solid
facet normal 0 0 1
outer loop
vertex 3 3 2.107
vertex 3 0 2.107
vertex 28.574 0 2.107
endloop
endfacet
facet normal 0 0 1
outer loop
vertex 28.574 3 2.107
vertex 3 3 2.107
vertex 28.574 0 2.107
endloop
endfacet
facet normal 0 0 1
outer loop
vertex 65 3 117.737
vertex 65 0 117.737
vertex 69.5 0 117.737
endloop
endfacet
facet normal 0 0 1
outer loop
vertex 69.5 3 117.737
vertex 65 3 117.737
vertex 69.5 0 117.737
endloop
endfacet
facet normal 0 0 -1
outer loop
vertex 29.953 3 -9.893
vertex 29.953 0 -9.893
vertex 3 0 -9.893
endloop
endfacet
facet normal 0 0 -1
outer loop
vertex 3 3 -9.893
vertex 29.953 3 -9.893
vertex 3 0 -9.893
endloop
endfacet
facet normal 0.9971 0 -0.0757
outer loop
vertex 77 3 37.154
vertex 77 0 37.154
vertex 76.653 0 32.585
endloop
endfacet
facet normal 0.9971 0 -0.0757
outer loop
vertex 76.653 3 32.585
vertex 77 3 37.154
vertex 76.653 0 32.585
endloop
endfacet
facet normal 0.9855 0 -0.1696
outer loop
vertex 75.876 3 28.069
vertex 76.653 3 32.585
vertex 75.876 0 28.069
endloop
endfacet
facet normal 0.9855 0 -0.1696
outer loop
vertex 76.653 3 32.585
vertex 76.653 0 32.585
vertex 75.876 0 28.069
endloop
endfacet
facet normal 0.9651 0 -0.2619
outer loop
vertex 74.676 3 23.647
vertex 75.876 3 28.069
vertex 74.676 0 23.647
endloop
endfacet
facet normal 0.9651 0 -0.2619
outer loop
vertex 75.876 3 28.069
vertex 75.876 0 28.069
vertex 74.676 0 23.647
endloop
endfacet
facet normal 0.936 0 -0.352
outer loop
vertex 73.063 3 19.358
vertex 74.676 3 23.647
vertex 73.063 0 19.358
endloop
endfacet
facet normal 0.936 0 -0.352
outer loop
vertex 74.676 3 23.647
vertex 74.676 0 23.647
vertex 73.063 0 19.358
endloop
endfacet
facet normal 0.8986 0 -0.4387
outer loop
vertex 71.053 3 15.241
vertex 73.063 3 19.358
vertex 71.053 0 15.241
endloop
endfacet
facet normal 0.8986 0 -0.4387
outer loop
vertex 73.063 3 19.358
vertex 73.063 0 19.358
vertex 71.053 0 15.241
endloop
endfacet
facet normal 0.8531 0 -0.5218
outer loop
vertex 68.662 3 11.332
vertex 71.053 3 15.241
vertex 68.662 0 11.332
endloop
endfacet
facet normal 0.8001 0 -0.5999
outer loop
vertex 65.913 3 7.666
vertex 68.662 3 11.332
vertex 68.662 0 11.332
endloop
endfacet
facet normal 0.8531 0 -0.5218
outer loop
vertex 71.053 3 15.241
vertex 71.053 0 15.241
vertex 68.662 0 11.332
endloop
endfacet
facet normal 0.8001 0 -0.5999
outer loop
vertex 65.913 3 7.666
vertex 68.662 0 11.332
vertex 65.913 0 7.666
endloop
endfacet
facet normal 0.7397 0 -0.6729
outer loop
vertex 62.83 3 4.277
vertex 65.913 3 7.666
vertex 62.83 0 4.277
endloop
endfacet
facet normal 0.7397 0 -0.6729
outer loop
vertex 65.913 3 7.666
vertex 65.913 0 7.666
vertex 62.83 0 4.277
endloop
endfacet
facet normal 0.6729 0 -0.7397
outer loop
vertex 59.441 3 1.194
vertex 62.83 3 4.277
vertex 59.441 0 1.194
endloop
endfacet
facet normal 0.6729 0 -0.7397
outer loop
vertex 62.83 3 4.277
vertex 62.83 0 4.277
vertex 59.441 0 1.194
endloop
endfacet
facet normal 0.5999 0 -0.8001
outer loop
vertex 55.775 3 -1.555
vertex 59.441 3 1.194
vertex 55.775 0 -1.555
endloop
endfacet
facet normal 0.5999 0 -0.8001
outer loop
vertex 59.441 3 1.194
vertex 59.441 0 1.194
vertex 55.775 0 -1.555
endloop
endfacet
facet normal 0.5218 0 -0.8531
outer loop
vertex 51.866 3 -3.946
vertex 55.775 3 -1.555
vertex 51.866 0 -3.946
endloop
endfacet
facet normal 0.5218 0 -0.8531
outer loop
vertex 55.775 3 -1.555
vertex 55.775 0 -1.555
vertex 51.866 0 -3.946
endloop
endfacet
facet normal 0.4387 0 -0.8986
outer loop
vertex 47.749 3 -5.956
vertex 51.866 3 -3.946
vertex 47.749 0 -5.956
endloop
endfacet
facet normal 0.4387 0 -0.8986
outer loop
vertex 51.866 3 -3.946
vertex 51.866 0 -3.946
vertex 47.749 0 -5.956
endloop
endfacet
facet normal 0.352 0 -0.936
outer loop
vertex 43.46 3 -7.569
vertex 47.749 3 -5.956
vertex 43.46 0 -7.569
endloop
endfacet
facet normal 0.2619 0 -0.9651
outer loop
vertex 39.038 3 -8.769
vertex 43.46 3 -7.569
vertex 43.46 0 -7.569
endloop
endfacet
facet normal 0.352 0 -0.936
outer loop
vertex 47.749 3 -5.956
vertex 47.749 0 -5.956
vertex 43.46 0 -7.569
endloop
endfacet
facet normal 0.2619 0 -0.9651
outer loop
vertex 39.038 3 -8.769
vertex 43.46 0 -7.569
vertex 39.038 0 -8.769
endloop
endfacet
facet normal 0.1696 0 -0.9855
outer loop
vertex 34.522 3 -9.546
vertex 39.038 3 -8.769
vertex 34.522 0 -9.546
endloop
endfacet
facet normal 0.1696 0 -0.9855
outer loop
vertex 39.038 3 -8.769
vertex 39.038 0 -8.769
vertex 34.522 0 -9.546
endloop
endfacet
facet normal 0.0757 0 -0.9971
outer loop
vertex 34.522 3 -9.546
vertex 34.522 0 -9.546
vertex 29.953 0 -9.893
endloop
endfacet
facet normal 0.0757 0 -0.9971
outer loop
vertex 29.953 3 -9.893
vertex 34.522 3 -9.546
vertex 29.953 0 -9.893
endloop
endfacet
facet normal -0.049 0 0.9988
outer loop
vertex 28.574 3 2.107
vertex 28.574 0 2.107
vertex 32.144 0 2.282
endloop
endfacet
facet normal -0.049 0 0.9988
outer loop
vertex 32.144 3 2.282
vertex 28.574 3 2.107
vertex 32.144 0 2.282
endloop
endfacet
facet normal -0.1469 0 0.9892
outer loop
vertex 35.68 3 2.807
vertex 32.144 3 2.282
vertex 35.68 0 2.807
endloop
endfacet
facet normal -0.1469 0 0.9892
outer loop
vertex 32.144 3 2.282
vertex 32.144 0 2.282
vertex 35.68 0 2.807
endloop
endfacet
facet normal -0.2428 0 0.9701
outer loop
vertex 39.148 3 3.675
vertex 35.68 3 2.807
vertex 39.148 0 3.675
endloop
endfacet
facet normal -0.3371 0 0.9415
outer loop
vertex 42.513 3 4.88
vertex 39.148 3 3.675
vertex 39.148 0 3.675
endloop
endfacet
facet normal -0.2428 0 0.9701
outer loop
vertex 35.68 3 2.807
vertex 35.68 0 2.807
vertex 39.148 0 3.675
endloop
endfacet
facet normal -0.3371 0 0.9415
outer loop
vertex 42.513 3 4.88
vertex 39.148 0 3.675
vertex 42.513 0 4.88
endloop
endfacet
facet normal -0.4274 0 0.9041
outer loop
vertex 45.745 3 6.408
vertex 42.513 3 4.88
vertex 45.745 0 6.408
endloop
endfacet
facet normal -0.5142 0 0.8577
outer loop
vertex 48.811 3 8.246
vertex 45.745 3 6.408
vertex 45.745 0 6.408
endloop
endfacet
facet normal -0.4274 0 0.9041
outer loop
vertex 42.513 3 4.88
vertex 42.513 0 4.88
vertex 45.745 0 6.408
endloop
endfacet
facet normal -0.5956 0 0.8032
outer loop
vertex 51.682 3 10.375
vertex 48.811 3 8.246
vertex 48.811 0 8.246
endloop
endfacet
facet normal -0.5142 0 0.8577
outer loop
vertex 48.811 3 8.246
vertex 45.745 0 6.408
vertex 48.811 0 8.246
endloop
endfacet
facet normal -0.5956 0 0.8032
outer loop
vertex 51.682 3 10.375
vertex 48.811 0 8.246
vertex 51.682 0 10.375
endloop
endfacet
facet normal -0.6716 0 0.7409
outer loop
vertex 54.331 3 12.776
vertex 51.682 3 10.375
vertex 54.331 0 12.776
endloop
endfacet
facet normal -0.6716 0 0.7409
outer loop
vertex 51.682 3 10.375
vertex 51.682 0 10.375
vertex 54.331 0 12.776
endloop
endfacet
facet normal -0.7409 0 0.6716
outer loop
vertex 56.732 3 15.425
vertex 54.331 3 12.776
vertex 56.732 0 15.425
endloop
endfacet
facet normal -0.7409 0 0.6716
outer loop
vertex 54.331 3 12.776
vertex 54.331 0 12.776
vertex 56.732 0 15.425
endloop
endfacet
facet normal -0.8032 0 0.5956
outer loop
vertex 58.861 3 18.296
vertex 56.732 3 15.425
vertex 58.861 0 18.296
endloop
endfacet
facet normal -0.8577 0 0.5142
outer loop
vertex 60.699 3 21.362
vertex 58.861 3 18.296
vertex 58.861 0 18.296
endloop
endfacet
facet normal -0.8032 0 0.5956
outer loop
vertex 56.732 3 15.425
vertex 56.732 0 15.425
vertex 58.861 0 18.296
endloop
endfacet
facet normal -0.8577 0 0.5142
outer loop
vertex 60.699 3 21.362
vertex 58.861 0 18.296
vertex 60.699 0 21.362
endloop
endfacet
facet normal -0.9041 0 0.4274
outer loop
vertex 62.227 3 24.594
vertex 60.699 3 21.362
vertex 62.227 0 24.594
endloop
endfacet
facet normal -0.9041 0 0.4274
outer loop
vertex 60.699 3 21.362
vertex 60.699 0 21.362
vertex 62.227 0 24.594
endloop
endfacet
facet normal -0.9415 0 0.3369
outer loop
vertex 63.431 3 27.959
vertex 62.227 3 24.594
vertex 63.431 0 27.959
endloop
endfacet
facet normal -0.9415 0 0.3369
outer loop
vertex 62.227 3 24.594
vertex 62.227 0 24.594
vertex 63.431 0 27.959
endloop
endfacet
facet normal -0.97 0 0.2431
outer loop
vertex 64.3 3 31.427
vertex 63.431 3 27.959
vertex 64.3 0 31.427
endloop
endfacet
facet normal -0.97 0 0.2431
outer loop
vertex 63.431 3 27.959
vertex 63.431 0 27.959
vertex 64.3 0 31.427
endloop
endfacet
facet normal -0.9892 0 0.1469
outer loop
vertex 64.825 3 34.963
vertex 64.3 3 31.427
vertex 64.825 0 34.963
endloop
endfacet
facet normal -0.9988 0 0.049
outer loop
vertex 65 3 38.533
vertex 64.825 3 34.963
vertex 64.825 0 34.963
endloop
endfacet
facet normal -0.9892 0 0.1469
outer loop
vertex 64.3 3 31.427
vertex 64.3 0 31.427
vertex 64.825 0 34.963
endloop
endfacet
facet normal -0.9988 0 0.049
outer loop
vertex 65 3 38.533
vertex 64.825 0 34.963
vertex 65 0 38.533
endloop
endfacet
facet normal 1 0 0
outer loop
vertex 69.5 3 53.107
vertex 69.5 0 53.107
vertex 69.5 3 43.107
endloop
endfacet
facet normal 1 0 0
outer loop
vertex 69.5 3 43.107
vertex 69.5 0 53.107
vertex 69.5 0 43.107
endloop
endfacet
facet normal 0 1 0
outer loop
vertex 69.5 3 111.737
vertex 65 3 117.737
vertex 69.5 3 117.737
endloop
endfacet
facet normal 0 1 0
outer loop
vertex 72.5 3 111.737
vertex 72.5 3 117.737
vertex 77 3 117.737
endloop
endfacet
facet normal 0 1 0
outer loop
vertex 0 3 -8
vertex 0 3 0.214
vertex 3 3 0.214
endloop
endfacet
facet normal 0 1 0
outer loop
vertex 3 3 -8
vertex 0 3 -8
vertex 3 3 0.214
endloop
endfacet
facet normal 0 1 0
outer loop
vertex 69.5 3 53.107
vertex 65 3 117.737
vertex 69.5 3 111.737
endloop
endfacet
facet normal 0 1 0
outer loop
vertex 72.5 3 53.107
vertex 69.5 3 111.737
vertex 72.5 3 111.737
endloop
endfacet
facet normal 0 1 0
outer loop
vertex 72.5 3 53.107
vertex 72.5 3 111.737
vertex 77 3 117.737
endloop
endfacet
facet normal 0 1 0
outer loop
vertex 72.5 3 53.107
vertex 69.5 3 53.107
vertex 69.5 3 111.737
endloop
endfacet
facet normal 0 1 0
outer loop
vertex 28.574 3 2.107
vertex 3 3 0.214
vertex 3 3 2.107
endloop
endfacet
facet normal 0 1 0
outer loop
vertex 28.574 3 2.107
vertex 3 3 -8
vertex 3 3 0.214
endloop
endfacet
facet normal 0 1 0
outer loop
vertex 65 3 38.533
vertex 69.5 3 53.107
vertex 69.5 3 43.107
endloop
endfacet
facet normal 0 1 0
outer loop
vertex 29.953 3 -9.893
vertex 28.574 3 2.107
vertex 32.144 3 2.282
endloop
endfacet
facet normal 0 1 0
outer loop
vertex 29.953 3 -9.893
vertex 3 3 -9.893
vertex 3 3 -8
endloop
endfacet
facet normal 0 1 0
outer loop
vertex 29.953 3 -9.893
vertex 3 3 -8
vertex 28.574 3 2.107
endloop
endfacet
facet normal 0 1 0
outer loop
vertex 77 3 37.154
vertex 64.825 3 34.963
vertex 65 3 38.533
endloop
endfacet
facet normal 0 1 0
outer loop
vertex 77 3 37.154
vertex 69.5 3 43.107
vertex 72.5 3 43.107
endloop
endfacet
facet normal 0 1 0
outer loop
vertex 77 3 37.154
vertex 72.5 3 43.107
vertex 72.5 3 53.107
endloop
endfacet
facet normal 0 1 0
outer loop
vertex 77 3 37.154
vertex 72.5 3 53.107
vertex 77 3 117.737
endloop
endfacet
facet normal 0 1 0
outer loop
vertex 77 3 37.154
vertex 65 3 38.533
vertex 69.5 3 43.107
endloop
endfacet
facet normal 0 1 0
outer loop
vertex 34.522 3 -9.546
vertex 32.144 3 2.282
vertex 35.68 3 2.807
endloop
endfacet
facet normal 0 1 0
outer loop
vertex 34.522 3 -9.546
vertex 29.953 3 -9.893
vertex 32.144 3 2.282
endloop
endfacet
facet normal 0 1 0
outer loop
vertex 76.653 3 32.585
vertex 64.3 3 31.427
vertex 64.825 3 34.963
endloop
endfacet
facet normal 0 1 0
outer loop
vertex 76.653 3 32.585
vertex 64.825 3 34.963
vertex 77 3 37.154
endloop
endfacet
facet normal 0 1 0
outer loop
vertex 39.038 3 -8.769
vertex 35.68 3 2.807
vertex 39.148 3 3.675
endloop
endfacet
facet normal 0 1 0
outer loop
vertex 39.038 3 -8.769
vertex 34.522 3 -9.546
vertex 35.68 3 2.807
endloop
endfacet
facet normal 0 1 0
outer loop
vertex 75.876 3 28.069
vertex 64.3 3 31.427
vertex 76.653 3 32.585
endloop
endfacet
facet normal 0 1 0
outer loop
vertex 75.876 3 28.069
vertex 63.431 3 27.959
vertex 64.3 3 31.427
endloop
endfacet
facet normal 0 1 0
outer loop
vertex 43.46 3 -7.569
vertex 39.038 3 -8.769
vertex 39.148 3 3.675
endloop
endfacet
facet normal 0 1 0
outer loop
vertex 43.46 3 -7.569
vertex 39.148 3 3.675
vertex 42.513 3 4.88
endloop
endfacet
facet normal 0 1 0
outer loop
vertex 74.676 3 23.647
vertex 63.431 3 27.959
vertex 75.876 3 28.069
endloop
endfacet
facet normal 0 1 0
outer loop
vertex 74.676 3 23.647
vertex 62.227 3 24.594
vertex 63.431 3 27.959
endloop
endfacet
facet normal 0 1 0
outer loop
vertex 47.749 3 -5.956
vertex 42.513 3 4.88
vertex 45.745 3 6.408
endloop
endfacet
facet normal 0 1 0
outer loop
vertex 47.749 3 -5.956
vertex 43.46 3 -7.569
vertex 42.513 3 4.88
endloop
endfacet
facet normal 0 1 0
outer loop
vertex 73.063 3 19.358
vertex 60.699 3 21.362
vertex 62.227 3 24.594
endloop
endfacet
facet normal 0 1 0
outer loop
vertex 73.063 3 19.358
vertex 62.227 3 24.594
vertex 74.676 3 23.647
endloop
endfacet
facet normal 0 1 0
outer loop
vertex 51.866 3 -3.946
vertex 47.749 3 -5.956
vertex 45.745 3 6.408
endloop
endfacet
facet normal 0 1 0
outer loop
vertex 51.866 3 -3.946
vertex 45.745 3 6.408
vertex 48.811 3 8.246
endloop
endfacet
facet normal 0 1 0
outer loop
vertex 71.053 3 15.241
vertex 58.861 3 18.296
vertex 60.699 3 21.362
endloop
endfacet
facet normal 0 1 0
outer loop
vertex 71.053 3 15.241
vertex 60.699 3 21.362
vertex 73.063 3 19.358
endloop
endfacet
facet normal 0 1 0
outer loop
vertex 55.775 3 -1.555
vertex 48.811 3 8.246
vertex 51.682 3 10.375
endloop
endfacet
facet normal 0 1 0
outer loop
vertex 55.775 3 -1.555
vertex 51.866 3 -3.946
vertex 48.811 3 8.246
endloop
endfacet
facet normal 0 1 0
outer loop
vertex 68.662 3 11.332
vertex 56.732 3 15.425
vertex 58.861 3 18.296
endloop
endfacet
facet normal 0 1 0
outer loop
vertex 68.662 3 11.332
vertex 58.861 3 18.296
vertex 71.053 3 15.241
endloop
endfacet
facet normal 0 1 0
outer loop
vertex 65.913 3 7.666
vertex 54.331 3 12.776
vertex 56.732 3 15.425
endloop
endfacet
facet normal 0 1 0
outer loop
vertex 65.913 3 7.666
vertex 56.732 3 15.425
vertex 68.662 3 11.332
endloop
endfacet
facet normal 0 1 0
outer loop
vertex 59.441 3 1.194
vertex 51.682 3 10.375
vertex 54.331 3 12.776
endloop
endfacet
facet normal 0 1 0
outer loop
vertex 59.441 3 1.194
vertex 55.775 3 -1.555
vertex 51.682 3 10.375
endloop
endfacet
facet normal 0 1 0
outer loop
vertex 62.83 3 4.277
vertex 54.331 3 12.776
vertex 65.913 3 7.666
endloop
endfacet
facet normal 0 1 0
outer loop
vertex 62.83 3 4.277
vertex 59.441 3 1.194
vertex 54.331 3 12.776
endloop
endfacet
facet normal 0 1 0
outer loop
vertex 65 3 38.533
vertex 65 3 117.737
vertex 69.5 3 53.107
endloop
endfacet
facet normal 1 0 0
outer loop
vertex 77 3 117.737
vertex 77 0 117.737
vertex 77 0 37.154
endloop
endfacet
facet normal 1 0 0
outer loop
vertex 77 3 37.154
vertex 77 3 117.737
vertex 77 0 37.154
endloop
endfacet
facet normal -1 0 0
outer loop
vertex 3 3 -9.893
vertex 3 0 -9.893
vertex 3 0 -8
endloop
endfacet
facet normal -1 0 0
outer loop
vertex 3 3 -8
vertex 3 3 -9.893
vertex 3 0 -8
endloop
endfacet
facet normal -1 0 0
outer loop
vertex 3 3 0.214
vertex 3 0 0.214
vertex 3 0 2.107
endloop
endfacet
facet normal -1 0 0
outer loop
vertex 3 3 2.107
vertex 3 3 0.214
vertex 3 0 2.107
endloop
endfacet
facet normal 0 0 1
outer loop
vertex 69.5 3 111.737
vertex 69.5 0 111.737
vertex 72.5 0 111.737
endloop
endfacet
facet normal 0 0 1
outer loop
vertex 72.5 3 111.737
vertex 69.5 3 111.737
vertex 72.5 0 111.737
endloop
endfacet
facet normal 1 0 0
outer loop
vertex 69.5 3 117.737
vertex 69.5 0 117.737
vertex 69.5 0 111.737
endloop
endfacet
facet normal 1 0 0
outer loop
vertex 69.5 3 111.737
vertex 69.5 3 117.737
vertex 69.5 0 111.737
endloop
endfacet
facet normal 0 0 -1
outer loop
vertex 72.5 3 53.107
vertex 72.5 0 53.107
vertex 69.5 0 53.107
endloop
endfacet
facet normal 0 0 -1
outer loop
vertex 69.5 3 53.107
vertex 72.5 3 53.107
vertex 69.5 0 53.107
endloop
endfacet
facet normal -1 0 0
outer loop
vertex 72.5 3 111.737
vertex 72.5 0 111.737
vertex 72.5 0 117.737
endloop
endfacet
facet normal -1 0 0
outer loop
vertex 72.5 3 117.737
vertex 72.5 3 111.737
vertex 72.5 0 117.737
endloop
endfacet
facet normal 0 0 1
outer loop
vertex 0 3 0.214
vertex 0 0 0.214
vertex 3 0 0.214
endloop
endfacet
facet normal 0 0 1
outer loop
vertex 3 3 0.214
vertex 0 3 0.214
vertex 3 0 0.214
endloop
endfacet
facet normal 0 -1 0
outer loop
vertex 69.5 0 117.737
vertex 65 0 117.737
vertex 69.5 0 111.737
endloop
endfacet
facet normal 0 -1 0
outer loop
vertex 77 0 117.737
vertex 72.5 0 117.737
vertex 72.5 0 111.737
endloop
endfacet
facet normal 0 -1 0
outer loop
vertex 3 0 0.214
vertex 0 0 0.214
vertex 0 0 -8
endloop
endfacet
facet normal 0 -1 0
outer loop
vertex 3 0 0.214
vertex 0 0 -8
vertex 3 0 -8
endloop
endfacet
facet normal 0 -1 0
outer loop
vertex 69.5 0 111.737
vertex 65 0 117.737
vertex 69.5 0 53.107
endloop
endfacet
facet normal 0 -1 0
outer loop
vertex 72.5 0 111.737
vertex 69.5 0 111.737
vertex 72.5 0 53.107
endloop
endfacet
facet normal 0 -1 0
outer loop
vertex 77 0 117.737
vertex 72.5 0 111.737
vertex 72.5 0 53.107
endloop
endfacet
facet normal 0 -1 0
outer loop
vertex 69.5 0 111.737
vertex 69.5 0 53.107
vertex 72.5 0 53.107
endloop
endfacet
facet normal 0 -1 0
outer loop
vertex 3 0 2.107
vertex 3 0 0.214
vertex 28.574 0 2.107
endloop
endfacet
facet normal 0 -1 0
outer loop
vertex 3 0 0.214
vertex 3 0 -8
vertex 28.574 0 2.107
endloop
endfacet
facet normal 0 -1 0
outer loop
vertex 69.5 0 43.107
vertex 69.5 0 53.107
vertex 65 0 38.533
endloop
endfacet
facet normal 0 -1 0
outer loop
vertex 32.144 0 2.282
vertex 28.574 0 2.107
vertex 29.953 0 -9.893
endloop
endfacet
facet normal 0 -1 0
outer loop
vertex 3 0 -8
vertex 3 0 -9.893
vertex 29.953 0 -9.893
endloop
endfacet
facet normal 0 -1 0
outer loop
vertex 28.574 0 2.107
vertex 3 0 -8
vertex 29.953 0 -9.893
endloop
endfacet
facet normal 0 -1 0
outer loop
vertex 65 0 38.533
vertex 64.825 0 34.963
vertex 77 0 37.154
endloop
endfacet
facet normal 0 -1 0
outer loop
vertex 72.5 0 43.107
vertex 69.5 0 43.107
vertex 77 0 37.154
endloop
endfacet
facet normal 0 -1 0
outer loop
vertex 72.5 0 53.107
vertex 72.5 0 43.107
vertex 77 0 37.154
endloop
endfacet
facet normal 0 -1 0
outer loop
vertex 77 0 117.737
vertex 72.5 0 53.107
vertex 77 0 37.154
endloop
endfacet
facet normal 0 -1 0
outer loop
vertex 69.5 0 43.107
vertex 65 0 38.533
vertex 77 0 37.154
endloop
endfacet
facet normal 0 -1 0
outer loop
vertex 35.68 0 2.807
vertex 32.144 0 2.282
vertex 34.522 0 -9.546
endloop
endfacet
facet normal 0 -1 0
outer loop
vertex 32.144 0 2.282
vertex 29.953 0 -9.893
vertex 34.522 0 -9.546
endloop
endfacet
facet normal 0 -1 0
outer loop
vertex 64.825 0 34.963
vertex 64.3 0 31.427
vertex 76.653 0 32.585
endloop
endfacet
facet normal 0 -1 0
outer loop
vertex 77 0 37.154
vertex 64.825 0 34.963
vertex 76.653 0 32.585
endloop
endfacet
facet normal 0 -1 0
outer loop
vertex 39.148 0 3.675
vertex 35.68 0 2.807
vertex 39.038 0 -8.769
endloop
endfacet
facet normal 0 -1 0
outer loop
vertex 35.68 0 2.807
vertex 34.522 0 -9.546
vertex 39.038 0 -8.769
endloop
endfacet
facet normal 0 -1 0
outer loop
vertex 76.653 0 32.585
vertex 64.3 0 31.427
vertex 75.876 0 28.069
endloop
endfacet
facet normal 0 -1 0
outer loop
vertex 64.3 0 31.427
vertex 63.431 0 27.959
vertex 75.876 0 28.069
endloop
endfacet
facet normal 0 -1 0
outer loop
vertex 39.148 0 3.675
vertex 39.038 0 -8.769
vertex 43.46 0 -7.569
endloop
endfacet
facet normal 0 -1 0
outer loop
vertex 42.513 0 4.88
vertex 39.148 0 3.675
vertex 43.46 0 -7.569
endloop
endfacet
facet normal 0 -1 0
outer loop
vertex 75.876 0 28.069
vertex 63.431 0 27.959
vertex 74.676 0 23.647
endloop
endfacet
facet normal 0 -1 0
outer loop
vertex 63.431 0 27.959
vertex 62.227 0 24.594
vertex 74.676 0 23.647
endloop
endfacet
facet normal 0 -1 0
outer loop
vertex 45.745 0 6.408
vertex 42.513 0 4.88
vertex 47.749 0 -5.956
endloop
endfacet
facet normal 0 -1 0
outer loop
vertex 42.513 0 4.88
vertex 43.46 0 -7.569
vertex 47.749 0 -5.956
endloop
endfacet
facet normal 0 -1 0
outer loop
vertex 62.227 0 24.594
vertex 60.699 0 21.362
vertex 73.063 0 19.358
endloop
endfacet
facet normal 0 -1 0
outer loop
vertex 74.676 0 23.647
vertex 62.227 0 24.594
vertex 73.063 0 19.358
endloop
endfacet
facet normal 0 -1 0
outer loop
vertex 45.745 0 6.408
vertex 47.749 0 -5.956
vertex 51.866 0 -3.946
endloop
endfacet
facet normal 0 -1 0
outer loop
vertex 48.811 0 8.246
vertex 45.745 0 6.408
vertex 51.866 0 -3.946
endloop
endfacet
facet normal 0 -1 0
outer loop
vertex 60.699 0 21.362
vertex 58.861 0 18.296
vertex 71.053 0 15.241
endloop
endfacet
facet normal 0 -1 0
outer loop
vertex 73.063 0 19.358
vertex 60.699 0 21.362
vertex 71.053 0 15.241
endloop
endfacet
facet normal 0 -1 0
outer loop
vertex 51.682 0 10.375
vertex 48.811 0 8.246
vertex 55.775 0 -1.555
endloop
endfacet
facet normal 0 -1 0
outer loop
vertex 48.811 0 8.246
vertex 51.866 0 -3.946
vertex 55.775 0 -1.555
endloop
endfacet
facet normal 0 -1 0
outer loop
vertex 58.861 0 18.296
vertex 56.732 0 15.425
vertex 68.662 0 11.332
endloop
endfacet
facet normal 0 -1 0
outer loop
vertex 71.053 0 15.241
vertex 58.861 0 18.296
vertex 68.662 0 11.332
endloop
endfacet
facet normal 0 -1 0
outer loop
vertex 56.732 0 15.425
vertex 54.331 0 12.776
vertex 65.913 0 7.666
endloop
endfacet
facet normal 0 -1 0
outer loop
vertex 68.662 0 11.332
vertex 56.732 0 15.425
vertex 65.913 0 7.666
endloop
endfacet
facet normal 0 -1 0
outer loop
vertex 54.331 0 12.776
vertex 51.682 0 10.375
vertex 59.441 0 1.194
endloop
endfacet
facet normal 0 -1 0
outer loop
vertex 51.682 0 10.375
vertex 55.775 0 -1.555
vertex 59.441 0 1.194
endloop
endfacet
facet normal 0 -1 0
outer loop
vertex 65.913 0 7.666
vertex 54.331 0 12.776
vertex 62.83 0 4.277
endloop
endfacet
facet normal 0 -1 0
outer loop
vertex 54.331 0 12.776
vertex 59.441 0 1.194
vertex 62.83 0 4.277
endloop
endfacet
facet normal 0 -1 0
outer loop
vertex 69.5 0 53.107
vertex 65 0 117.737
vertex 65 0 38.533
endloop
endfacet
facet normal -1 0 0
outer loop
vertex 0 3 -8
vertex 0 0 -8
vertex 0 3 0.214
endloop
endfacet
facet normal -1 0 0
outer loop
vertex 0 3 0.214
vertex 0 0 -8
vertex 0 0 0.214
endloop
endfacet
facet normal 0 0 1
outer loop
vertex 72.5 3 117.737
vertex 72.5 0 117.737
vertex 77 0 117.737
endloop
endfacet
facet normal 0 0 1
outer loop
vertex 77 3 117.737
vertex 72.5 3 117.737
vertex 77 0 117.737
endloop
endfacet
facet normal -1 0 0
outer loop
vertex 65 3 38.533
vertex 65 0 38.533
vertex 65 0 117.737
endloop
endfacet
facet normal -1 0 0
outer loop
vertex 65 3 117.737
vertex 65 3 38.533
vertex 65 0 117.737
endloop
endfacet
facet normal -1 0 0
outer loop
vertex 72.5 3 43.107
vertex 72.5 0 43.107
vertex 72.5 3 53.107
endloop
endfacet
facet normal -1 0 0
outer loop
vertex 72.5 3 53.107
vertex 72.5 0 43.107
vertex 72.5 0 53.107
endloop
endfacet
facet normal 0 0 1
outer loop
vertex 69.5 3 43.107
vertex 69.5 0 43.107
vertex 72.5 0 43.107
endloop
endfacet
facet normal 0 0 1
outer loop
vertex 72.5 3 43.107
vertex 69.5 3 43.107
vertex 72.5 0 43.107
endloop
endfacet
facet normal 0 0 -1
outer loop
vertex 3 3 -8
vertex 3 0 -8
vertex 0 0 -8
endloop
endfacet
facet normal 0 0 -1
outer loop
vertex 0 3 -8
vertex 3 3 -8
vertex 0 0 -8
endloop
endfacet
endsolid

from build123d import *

# Parameters (mm, degrees)
SALIENTE_EXTRUIR1_DEPTH = 3


with BuildPart() as part:
    # Croquis1 → Saliente-Extruir1 (new body)
    with BuildSketch(Plane(origin=(0, 0, 0), x_dir=(1, 0, 0), z_dir=(0, 1, 0))):
        with BuildLine():
            Line((0, 7.786096257), (0, 0))
            Line((0, 0), (0, -0.213903743))
            Line((0, -0.213903743), (3, -0.213903743))
            Line((3, -0.213903743), (3, -2.106951872))
            Line((3, -2.106951872), (7.35828877, -2.106951872))
            Line((7.35828877, -2.106951872), (28.573593129, -2.106951872))
            ThreePointArc((28.573593129, -2.106951872), (54.330952442, -12.77599943), (65, -38.533358743))
            Line((65, -38.533358743), (65, -117.736951872))
            Line((65, -117.736951872), (69.5, -117.736951872))
            Line((69.5, -117.736951872), (69.5, -111.736951872))
            Line((69.5, -111.736951872), (72.5, -111.736951872))
            Line((72.5, -111.736951872), (72.5, -117.736951872))
            Line((72.5, -117.736951872), (77, -117.736951872))
            Line((77, -117.736951872), (77, -37.153707926))
            ThreePointArc((77, -37.153707926), (62.830127679, -4.276824192), (29.953243946, 9.893048128))
            Line((29.953243946, 9.893048128), (7.35828877, 9.893048128))
            Line((7.35828877, 9.893048128), (3, 9.893048128))
            Line((3, 9.893048128), (3, 8))
            Line((3, 8), (0, 8))
            Line((0, 8), (0, 7.786096257))
        make_face()
        Polygon((69.5, -53.106951872), (69.5, -48.106951872), (69.5, -43.106951872), (72.5, -43.106951872), (72.5, -53.106951872), align=None, mode=Mode.SUBTRACT)
    extrude(amount=SALIENTE_EXTRUIR1_DEPTH)


solid = part.part
